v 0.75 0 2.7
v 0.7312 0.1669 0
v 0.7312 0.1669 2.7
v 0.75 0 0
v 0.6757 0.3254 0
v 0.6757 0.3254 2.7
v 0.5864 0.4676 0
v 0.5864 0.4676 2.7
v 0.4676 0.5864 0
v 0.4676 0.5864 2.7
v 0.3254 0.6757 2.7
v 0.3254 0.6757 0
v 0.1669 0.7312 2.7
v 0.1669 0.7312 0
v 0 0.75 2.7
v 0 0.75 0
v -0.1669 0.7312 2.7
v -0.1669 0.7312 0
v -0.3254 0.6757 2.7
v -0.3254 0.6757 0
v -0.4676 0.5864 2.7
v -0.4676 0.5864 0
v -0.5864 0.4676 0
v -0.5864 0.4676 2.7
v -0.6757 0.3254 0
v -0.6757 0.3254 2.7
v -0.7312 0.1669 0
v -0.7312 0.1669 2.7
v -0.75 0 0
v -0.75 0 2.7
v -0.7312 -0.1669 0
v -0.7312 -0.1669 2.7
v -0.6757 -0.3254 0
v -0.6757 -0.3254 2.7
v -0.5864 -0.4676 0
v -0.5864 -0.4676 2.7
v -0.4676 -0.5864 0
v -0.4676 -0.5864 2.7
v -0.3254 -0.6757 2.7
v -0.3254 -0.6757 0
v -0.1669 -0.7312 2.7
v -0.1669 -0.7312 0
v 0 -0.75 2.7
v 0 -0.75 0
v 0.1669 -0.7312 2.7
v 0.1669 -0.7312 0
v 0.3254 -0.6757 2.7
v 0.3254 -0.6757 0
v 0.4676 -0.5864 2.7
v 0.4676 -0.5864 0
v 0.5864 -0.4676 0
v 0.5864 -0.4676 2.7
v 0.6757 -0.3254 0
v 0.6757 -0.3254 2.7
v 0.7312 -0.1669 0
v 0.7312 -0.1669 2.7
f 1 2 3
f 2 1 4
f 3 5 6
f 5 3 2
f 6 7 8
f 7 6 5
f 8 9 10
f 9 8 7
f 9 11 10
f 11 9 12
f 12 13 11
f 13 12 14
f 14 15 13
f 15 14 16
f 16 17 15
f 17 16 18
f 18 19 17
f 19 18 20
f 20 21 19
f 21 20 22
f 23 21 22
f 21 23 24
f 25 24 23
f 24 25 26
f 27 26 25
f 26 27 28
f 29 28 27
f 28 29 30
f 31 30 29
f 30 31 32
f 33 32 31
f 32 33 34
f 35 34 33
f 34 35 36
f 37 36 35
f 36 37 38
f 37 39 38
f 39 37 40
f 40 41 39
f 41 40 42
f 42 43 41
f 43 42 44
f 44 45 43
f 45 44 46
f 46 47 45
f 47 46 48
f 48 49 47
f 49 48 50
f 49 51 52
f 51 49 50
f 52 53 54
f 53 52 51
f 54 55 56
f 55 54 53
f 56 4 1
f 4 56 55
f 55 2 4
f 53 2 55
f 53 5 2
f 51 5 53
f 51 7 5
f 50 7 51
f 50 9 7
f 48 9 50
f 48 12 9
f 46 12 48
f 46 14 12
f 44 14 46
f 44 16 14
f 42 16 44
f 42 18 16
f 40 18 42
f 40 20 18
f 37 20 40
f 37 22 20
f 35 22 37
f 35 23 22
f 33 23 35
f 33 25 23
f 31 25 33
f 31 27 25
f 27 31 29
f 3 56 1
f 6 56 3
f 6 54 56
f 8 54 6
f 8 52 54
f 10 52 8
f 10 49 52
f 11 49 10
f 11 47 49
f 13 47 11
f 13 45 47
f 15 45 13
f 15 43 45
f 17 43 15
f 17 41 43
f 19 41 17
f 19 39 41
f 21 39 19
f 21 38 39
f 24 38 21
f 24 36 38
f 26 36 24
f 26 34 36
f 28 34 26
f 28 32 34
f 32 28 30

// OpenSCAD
// part_id: mar8
// name: Mars rivet pin
// source_drawing_ids: DRW-013
// units: mm
// revision: 0.1
// SPDX-License-Identifier: MIT

module part_mar8(pin_d = 1.5, pin_h = 2.7) {
    cylinder(d = pin_d, h = pin_h, center = false, $fn = 28);
}

// ---- "main guard" ----
if (is_undef(__LIB_MODE__)) {
    part_mar8();
}
